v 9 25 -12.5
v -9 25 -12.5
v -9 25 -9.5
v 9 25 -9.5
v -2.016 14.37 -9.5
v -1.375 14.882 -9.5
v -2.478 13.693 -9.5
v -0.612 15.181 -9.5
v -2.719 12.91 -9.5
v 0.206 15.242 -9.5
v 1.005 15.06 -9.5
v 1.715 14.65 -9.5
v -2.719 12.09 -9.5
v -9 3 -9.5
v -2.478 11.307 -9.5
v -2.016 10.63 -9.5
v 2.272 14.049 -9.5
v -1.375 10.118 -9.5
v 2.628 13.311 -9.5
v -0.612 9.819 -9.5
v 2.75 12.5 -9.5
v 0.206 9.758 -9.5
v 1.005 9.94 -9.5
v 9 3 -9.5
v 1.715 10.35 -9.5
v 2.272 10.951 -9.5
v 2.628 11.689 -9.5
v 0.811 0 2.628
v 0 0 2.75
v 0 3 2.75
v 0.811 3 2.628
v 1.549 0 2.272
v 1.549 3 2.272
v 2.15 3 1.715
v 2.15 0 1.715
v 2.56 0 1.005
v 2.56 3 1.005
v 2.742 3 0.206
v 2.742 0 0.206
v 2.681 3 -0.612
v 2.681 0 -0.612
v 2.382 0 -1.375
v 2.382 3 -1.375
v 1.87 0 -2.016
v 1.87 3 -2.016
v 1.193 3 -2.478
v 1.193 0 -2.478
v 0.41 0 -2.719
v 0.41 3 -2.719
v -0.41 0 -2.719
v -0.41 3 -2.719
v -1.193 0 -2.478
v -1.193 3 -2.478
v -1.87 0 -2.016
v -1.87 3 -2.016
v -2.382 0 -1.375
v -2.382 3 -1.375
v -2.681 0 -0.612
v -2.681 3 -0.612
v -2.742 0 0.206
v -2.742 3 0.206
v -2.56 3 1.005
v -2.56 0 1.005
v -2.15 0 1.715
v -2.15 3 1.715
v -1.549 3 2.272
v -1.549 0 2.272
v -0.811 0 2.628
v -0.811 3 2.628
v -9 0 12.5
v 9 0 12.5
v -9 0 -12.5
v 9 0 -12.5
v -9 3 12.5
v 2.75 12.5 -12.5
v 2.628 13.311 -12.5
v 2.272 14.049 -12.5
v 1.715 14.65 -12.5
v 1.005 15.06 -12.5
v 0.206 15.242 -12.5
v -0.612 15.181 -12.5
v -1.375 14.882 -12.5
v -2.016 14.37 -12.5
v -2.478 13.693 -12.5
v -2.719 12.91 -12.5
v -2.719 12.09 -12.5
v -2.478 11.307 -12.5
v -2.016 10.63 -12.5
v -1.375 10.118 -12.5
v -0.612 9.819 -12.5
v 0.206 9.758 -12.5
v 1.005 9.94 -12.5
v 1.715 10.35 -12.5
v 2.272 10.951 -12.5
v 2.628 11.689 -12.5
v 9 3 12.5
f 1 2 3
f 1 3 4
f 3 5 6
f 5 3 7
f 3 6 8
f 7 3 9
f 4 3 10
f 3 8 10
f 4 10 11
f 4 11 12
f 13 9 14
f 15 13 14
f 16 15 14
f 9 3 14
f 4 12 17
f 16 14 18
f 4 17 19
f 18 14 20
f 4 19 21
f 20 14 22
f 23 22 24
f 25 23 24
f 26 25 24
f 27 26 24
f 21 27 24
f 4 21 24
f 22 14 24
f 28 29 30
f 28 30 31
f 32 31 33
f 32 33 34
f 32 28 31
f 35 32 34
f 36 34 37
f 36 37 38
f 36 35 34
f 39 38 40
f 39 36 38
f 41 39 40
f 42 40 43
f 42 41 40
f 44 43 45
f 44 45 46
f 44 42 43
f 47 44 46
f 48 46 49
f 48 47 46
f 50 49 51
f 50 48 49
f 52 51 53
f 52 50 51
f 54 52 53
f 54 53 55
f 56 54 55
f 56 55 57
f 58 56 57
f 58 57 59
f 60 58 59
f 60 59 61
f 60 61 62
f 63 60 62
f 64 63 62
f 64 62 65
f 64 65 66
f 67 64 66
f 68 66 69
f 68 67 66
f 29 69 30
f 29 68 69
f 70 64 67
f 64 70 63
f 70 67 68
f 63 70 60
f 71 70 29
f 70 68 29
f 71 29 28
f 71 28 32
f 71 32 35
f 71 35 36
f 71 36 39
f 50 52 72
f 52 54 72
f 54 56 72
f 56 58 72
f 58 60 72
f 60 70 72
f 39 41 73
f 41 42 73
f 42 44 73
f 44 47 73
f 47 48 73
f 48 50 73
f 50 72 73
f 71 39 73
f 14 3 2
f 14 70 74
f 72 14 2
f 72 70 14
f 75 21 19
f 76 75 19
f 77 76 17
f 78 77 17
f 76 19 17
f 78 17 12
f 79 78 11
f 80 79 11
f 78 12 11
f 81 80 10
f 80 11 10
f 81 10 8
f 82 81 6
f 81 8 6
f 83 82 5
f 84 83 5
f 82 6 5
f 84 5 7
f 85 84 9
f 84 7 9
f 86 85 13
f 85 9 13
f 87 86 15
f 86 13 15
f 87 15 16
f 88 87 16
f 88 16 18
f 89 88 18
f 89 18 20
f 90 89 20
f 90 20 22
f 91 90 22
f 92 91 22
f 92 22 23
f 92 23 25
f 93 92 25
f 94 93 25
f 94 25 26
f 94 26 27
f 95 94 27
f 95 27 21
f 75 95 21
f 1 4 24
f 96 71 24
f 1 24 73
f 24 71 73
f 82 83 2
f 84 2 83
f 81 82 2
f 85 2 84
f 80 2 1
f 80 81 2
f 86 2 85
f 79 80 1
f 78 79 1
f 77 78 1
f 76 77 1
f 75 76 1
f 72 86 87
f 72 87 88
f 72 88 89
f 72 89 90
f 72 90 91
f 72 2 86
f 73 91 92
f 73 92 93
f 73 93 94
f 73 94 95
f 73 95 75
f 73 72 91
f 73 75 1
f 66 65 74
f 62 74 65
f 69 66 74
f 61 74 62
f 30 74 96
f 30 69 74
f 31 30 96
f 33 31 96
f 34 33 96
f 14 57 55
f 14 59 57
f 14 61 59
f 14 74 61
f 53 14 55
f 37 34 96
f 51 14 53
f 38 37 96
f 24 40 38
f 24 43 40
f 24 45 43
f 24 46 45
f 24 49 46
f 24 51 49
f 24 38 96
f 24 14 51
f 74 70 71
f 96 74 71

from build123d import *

# Parameters (mm, degrees)
SKETCH_1_W          = 18
SKETCH_1_H          = 25
SKETCH_1_R          = 2.75
EXTRUDE_1_DEPTH     = 3
SKETCH_2_W          = 18
SKETCH_2_H          = 3
EXTRUDE_2_DEPTH     = 22
SKETCH_3_R          = 2.75
CUT_EXTRUDE_1_DEPTH = 22


with BuildPart() as part:
    # 草图1 → 凸台-拉伸1 (new body)
    with BuildSketch(Plane(origin=(0, 0, 0), x_dir=(1, 0, 0), z_dir=(0, 1, 0))):
        Rectangle(SKETCH_1_W, SKETCH_1_H)
        with Locations(Location((0, 0, 0), (0, 0, 270))):
            Circle(SKETCH_1_R, mode=Mode.SUBTRACT)
    extrude(amount=EXTRUDE_1_DEPTH)

    # 草图2 → 凸台-拉伸2 (add)
    with BuildSketch(Plane(origin=(0, 3, 0), x_dir=(1, 0, 0), z_dir=(0, 1, 0))):
        with Locations((0, 11)):
            Rectangle(SKETCH_2_W, SKETCH_2_H)
    extrude(amount=EXTRUDE_2_DEPTH)

    # 草图3 → 切除-拉伸1 (cut)
    with BuildSketch(Plane.XY.offset(-9.5)):
        with Locations((0, 12.5)):
            Circle(SKETCH_3_R)
    extrude(amount=-CUT_EXTRUDE_1_DEPTH, mode=Mode.SUBTRACT)


solid = part.part
